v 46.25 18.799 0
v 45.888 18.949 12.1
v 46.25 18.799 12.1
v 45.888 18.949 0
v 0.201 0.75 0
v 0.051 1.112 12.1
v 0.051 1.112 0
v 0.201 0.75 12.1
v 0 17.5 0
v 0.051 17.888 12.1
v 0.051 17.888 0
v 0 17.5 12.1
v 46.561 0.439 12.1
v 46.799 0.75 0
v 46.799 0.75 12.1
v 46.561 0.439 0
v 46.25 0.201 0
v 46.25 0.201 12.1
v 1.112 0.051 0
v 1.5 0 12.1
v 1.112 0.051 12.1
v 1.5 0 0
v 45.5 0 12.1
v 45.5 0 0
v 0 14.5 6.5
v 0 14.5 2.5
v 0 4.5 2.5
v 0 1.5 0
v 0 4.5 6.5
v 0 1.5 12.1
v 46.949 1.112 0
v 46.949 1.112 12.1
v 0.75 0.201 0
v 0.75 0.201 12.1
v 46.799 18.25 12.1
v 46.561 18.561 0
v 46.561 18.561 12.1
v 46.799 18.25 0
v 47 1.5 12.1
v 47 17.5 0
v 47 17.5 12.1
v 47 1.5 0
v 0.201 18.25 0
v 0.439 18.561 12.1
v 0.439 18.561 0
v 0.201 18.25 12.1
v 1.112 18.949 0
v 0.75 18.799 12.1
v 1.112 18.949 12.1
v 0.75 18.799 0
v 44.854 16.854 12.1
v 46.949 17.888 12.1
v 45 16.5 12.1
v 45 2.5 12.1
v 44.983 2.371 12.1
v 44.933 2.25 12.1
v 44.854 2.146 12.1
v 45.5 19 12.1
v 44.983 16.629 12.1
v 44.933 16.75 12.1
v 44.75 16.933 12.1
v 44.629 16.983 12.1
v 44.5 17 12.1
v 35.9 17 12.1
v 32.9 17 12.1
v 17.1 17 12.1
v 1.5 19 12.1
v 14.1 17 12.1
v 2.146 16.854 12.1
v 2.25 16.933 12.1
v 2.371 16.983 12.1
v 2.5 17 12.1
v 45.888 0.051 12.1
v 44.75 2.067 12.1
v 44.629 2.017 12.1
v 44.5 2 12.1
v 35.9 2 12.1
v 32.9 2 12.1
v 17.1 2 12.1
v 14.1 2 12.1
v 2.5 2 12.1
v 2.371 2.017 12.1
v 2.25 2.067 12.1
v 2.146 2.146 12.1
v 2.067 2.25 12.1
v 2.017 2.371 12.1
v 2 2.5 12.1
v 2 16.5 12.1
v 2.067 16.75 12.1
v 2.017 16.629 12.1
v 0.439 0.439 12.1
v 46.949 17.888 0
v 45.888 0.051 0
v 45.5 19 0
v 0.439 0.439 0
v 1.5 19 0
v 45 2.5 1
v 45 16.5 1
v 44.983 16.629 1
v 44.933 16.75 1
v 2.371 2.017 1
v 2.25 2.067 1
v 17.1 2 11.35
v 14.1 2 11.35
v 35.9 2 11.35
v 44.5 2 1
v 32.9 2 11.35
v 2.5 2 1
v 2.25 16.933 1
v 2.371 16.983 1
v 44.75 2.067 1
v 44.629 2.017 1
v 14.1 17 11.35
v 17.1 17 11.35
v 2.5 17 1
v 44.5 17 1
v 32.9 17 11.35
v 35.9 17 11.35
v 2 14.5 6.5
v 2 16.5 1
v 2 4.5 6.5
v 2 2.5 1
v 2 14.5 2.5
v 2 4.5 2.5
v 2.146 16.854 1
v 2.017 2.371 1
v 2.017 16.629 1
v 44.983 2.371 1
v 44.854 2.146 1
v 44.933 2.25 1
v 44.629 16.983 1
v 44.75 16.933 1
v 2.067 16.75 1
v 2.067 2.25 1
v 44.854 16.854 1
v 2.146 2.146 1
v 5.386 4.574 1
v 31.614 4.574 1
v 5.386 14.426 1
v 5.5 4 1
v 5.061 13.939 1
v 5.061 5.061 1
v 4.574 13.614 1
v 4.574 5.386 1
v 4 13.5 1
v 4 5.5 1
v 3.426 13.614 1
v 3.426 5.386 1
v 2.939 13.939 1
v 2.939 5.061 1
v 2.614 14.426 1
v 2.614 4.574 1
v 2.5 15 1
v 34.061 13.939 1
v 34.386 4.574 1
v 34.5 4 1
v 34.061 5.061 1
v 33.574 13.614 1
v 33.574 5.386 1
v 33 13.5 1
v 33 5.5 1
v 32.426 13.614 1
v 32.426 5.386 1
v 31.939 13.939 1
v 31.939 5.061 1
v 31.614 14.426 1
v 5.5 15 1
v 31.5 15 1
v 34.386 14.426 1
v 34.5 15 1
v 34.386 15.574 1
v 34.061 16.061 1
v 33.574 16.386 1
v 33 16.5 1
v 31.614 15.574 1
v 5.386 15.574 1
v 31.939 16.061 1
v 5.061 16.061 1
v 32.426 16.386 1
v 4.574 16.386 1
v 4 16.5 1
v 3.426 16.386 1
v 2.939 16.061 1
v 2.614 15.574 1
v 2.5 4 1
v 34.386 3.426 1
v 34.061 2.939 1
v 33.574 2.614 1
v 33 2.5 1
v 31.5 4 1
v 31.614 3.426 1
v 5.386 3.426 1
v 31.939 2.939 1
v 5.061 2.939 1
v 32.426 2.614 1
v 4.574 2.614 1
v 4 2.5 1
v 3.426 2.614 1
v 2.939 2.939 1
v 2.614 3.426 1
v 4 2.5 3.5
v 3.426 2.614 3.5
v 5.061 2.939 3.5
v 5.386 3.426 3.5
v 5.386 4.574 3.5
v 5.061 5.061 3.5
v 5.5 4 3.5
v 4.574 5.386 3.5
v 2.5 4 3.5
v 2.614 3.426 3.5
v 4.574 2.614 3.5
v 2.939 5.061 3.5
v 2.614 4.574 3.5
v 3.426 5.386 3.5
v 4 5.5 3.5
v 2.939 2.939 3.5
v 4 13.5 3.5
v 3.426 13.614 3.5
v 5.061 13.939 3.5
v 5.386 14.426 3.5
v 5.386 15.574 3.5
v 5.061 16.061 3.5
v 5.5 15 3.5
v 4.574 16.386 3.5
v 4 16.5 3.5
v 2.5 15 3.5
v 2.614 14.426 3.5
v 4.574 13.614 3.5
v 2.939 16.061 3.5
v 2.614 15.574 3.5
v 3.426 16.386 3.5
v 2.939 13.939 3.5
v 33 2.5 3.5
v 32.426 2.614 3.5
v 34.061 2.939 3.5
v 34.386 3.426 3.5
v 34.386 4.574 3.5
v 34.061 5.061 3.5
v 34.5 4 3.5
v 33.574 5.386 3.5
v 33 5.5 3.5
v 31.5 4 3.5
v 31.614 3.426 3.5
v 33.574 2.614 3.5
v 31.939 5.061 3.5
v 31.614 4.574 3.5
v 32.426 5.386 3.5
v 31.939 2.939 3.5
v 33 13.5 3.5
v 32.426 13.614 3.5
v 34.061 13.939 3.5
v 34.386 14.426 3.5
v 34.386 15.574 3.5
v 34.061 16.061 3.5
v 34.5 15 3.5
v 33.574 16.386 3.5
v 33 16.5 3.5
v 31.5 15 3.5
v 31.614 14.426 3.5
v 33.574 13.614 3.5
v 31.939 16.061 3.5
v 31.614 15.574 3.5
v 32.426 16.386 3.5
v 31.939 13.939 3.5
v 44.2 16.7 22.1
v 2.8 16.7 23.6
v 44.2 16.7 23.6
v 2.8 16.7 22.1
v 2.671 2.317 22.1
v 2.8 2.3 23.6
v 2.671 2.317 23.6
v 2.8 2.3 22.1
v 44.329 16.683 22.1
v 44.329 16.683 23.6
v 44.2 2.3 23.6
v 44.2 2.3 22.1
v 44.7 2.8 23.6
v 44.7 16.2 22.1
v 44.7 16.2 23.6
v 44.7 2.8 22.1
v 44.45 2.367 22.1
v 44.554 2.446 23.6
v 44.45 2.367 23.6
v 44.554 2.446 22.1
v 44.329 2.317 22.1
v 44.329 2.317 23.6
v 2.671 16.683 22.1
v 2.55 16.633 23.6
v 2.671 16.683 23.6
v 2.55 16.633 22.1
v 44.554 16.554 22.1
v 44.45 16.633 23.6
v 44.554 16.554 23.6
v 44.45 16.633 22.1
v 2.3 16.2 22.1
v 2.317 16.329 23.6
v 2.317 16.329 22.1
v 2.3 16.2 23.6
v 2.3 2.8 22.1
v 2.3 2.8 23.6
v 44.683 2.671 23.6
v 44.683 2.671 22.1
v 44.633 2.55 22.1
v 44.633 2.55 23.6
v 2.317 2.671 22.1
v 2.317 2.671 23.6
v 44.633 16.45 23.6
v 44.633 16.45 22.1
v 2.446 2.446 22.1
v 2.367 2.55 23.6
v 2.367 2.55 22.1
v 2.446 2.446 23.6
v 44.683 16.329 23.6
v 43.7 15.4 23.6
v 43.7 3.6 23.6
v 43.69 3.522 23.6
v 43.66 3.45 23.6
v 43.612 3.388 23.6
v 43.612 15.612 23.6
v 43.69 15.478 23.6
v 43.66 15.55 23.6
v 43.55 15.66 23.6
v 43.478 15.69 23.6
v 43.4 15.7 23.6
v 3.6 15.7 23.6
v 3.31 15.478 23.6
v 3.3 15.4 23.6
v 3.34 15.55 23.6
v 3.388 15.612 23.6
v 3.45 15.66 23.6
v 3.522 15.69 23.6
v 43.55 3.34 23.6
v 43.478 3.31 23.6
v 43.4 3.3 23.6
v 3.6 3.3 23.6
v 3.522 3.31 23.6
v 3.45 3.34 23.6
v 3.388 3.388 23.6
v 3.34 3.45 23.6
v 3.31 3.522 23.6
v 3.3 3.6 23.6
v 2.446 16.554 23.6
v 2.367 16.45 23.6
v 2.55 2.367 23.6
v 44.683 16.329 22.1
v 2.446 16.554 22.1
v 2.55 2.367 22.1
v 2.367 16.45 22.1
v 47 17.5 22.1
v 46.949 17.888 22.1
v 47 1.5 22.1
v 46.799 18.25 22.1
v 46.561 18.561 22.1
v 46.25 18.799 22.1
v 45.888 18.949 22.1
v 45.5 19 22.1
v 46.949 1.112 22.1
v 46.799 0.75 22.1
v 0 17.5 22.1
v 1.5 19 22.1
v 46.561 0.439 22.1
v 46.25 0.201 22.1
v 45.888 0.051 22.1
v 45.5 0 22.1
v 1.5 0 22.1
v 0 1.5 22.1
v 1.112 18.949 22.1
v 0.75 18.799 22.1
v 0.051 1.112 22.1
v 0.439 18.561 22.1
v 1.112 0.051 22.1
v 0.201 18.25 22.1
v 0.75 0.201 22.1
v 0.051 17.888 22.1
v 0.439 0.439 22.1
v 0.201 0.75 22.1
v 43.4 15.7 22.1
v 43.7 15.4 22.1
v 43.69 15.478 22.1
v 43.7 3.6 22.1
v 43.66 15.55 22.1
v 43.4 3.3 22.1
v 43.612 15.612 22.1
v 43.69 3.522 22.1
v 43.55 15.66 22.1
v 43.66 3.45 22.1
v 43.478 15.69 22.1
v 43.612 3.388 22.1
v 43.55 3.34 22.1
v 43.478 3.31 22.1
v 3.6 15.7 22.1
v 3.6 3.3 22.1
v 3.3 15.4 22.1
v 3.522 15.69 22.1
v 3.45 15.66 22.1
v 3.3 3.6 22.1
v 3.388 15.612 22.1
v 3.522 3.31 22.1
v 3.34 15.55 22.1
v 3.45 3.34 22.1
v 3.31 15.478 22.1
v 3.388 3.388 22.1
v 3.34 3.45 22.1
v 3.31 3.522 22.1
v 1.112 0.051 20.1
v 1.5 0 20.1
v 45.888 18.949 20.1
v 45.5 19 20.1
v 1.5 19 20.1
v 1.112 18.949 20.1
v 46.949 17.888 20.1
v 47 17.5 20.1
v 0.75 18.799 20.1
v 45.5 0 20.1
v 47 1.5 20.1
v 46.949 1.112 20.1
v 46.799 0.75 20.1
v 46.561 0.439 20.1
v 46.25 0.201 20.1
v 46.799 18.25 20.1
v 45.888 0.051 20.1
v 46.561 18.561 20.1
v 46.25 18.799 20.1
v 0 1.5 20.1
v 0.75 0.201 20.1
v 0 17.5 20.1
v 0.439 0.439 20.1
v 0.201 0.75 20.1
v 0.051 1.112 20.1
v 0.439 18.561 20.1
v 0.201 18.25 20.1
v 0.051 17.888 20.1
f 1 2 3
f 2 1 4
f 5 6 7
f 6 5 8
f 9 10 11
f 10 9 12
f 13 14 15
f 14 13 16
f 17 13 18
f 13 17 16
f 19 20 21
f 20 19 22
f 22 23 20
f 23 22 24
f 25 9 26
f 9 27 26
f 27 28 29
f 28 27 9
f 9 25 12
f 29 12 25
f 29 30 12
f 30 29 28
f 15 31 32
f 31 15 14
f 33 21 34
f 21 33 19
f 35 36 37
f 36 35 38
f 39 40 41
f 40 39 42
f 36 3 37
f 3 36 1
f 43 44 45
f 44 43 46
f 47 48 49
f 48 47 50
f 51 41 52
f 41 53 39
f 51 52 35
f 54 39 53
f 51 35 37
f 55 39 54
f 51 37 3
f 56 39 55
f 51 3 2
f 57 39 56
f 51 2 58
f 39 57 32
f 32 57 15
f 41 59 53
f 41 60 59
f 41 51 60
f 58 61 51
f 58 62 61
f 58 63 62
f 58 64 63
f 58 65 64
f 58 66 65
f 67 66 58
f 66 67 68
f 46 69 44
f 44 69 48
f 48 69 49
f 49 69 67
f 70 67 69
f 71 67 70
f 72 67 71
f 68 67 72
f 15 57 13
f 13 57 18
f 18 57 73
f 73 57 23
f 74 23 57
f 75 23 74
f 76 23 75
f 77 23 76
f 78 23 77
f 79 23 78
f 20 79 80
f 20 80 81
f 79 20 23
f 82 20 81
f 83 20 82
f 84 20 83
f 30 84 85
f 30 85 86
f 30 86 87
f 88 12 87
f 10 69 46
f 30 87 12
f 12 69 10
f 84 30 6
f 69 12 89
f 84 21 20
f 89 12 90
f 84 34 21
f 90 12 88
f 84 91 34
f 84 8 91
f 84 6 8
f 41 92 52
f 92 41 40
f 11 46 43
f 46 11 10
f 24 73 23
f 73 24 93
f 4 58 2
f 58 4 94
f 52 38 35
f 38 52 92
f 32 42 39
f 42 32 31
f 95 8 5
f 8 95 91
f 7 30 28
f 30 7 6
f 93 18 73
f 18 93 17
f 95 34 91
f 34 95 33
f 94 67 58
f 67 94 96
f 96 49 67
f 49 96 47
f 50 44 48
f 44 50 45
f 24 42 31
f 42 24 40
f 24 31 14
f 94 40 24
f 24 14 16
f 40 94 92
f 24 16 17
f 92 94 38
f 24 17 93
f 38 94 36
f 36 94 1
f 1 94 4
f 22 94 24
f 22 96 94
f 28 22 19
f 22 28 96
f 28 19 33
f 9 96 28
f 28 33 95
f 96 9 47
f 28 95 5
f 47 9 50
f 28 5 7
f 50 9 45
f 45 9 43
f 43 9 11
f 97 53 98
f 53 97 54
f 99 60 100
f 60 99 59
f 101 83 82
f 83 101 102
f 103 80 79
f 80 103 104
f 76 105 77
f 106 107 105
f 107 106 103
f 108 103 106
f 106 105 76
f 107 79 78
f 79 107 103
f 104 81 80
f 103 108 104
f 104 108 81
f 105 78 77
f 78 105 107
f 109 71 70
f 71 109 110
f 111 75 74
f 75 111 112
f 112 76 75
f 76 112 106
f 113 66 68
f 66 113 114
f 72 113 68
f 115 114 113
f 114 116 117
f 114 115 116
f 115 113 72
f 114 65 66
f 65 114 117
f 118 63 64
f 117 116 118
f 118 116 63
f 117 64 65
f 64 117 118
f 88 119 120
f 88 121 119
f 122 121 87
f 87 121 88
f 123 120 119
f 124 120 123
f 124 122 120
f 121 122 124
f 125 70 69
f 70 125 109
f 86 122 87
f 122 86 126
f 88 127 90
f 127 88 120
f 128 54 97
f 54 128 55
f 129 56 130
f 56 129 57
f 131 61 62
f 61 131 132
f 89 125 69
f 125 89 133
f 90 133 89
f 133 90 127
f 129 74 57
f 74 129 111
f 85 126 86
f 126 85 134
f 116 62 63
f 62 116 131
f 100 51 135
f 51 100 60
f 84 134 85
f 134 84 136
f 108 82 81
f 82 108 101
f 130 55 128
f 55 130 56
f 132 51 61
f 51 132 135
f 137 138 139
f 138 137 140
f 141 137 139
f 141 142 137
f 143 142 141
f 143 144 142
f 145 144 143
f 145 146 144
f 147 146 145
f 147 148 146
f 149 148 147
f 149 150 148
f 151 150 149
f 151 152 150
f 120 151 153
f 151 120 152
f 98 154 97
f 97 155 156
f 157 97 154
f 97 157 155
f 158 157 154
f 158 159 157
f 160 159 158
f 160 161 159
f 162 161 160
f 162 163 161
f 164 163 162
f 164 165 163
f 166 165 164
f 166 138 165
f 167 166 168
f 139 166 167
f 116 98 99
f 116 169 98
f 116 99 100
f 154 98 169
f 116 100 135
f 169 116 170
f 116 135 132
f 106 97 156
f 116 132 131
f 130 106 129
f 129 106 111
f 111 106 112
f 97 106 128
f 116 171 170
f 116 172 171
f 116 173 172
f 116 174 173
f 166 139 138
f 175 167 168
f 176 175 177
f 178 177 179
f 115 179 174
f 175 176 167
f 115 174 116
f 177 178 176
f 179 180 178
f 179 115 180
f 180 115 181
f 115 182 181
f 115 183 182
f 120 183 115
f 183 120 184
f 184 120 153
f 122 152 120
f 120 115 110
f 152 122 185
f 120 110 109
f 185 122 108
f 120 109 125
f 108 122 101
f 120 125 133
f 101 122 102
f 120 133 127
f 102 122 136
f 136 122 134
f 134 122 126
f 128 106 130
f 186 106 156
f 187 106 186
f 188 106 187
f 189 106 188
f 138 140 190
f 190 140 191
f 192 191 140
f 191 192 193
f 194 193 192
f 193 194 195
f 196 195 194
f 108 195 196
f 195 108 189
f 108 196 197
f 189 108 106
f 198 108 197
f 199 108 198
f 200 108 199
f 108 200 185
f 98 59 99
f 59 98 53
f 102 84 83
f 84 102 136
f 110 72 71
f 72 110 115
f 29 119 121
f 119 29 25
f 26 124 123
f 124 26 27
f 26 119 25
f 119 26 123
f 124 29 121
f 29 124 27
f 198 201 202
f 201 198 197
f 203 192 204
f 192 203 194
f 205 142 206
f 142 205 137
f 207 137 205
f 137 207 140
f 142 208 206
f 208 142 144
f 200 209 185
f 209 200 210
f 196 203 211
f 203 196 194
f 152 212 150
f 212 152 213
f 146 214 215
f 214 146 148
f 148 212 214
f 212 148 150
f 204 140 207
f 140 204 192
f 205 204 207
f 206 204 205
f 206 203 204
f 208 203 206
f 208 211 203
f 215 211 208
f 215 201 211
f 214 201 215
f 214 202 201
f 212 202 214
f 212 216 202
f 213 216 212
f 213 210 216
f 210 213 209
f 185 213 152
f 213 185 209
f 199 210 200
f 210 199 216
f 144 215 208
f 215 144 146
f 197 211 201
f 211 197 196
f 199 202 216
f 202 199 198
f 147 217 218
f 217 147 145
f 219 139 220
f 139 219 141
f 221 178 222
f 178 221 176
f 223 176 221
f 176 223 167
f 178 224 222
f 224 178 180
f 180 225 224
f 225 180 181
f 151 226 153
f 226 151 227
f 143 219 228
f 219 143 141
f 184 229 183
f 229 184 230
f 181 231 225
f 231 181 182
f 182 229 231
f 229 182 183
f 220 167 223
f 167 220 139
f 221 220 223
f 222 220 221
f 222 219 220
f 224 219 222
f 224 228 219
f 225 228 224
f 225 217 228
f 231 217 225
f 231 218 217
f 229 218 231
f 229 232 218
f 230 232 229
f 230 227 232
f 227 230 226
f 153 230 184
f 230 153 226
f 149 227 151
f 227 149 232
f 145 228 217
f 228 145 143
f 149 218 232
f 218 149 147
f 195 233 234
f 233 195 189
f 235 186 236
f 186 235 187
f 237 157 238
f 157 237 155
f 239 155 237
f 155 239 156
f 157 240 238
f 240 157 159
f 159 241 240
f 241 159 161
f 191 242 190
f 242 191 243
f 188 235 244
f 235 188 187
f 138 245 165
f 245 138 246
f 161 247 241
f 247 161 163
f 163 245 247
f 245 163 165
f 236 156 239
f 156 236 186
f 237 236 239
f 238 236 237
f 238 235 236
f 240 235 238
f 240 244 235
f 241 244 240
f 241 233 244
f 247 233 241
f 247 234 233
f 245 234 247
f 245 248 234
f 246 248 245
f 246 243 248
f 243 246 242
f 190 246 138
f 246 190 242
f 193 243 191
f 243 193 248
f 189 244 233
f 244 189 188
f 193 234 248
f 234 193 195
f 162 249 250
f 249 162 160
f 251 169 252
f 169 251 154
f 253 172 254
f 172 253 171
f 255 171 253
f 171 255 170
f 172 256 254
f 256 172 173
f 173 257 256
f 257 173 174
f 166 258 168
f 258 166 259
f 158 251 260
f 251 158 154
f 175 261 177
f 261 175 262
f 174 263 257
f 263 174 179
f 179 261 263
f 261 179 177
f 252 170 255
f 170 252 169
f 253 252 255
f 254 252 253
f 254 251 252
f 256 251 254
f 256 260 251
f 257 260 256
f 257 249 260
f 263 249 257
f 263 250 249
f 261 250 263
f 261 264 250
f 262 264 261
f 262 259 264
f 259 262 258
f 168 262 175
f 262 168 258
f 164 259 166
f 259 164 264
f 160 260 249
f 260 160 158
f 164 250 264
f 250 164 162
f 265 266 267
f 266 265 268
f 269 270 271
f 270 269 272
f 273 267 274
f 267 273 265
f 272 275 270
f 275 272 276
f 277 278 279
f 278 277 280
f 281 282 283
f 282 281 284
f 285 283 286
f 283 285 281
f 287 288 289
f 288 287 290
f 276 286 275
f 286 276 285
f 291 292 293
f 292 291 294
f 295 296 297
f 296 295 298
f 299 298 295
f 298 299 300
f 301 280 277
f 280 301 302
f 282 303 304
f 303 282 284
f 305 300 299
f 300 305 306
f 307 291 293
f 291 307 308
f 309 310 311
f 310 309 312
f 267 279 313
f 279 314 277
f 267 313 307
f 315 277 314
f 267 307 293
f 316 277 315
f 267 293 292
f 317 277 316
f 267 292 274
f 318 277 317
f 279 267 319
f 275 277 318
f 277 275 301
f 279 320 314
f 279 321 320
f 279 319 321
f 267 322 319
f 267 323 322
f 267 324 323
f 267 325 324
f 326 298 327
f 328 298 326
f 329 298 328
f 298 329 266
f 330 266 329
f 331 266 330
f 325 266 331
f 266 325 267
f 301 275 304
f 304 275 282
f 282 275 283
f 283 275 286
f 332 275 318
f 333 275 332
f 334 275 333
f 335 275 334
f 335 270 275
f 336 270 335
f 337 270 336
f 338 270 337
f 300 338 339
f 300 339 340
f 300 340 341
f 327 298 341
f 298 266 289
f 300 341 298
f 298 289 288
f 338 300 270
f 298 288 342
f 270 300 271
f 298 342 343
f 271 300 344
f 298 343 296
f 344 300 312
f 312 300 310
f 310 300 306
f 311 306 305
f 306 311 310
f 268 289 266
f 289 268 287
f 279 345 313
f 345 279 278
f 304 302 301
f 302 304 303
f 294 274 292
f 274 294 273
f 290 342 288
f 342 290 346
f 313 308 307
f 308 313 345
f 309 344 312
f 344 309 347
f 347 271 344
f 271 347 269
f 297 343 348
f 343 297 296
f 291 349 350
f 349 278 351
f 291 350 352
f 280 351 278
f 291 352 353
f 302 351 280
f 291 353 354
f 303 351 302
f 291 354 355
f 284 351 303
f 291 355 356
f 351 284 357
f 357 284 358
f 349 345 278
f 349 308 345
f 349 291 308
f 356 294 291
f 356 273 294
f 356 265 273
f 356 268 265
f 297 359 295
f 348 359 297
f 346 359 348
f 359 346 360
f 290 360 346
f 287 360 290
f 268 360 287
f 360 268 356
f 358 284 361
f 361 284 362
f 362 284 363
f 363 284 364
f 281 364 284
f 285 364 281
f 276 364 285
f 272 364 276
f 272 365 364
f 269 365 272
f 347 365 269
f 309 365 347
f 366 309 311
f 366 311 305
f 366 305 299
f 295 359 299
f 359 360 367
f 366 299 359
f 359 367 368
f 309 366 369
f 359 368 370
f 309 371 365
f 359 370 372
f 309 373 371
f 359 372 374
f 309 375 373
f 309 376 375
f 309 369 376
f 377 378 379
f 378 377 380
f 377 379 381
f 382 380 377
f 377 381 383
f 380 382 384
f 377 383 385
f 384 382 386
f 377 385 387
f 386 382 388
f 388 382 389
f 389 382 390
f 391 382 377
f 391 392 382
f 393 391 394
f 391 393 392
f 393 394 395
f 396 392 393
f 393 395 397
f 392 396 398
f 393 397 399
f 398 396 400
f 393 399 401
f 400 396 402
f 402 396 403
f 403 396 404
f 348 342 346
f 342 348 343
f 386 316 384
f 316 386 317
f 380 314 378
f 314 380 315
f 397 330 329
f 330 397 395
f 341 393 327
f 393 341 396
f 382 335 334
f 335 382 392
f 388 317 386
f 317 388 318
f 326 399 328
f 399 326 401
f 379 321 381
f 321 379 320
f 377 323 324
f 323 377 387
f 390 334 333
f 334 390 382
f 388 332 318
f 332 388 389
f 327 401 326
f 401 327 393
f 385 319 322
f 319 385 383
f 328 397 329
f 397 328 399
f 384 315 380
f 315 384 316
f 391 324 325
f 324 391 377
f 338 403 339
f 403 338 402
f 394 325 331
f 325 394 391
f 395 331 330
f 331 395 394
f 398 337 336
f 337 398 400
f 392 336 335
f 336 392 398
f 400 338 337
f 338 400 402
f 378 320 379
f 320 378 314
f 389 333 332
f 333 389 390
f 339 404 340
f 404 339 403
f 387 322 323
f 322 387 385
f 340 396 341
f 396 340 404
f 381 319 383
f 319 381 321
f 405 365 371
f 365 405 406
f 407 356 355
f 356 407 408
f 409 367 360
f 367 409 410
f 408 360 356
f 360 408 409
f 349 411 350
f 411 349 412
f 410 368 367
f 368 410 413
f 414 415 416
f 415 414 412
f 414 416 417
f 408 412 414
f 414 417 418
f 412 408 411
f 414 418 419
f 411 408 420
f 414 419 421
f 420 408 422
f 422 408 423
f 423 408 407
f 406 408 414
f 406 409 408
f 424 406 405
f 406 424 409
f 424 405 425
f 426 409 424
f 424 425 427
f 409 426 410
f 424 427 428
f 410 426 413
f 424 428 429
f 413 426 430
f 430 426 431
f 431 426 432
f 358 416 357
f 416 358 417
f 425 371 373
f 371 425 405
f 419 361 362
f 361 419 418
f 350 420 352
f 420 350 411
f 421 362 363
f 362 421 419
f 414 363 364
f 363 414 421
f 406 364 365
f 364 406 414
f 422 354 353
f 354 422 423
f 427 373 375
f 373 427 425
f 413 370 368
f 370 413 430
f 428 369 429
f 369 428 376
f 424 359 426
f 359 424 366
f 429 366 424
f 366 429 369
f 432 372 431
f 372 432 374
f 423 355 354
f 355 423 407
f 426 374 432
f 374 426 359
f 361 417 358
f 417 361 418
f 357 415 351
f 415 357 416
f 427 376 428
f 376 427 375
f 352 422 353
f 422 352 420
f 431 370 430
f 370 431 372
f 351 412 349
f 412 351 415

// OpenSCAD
// SW-420 Vibration Sensor Enclosure
// Small box with wire exit, thin bottom for vibration transfer

/* [Board Dimensions] */
// SW-420 module PCB
pcb_length = 32;    // mm
pcb_width  = 14;    // mm
pcb_thick  = 1.6;   // mm
component_height = 5; // tallest component on top (potentiometer/LED)
pin_height = 2.5;   // pin length below PCB
pin_length = 10;    // pins extend from PCB edge + wire connectors

/* [Wire Exit] */
wire_slot_width = 10; // 3 wires
wire_slot_height = 4;

/* [Case Parameters] */
wall       = 2;       // wall thickness
bottom     = 1;       // thinner bottom to transmit vibration
clearance  = 0.5;     // gap around PCB
post_d     = 3;       // support post diameter
lid_lip    = 1.5;     // lip height for friction fit
snap_nub   = 0.4;     // snap nub size
corner_r   = 1.5;     // corner rounding radius

/* [Computed] */
inner_l = pcb_length + pin_length + clearance * 2;
inner_w = pcb_width + clearance * 2;
inner_h = pin_height + pcb_thick + component_height + 2; // 2mm headroom

outer_l = inner_l + wall * 2;
outer_w = inner_w + wall * 2;
outer_h = inner_h + bottom;

pcb_z = bottom + pin_height;

/* [Rendering] */
part = "both"; // [base, lid, both]
explode = 8;

module rounded_box(l, w, h, r) {
    hull() {
        for (x = [r, l - r])
            for (y = [r, w - r])
                translate([x, y, 0])
                    cylinder(r = r, h = h, $fn = 24);
    }
}

module base() {
    difference() {
        // Outer shell
        rounded_box(outer_l, outer_w, outer_h, corner_r);

        // Inner cavity
        translate([wall, wall, bottom])
            rounded_box(inner_l, inner_w, inner_h + 1, max(corner_r - wall, 0.5));

        // Wire exit slot (on -X end)
        translate([
            -0.5,
            outer_w / 2 - wire_slot_width / 2,
            pcb_z - 1
        ])
            cube([wall + 1, wire_slot_width, wire_slot_height]);
    }

    // PCB support posts (4 corners)
    post_inset = 1.5;
    for (x = [wall + clearance + post_inset,
              wall + clearance + pcb_length - post_inset])
        for (y = [wall + clearance + post_inset,
                  wall + clearance + pcb_width - post_inset])
            translate([x, y, bottom])
                cylinder(d = post_d, h = pin_height, $fn = 16);

    // Lid snap nubs on inner walls (long sides)
    for (y = [wall - snap_nub, outer_w - wall])
        for (x = [outer_l * 0.3, outer_l * 0.7])
            translate([x, y, outer_h - lid_lip / 2])
                cube([3, snap_nub, lid_lip / 2]);
}

module lid() {
    lip_clearance = 0.3;

    // Flat top
    rounded_box(outer_l, outer_w, wall, corner_r);

    // Inner lip
    translate([wall + lip_clearance, wall + lip_clearance, wall])
        difference() {
            rounded_box(
                inner_l - lip_clearance * 2,
                inner_w - lip_clearance * 2,
                lid_lip,
                max(corner_r - wall, 0.5)
            );
            translate([wall / 2, wall / 2, -0.1])
                rounded_box(
                    inner_l - lip_clearance * 2 - wall,
                    inner_w - lip_clearance * 2 - wall,
                    lid_lip + 0.2,
                    max(corner_r - wall * 1.5, 0.3)
                );
        }
}

if (part == "base" || part == "both") {
    base();
}

if (part == "lid" || part == "both") {
    translate([0, 0, outer_h + explode])
        lid();
}
